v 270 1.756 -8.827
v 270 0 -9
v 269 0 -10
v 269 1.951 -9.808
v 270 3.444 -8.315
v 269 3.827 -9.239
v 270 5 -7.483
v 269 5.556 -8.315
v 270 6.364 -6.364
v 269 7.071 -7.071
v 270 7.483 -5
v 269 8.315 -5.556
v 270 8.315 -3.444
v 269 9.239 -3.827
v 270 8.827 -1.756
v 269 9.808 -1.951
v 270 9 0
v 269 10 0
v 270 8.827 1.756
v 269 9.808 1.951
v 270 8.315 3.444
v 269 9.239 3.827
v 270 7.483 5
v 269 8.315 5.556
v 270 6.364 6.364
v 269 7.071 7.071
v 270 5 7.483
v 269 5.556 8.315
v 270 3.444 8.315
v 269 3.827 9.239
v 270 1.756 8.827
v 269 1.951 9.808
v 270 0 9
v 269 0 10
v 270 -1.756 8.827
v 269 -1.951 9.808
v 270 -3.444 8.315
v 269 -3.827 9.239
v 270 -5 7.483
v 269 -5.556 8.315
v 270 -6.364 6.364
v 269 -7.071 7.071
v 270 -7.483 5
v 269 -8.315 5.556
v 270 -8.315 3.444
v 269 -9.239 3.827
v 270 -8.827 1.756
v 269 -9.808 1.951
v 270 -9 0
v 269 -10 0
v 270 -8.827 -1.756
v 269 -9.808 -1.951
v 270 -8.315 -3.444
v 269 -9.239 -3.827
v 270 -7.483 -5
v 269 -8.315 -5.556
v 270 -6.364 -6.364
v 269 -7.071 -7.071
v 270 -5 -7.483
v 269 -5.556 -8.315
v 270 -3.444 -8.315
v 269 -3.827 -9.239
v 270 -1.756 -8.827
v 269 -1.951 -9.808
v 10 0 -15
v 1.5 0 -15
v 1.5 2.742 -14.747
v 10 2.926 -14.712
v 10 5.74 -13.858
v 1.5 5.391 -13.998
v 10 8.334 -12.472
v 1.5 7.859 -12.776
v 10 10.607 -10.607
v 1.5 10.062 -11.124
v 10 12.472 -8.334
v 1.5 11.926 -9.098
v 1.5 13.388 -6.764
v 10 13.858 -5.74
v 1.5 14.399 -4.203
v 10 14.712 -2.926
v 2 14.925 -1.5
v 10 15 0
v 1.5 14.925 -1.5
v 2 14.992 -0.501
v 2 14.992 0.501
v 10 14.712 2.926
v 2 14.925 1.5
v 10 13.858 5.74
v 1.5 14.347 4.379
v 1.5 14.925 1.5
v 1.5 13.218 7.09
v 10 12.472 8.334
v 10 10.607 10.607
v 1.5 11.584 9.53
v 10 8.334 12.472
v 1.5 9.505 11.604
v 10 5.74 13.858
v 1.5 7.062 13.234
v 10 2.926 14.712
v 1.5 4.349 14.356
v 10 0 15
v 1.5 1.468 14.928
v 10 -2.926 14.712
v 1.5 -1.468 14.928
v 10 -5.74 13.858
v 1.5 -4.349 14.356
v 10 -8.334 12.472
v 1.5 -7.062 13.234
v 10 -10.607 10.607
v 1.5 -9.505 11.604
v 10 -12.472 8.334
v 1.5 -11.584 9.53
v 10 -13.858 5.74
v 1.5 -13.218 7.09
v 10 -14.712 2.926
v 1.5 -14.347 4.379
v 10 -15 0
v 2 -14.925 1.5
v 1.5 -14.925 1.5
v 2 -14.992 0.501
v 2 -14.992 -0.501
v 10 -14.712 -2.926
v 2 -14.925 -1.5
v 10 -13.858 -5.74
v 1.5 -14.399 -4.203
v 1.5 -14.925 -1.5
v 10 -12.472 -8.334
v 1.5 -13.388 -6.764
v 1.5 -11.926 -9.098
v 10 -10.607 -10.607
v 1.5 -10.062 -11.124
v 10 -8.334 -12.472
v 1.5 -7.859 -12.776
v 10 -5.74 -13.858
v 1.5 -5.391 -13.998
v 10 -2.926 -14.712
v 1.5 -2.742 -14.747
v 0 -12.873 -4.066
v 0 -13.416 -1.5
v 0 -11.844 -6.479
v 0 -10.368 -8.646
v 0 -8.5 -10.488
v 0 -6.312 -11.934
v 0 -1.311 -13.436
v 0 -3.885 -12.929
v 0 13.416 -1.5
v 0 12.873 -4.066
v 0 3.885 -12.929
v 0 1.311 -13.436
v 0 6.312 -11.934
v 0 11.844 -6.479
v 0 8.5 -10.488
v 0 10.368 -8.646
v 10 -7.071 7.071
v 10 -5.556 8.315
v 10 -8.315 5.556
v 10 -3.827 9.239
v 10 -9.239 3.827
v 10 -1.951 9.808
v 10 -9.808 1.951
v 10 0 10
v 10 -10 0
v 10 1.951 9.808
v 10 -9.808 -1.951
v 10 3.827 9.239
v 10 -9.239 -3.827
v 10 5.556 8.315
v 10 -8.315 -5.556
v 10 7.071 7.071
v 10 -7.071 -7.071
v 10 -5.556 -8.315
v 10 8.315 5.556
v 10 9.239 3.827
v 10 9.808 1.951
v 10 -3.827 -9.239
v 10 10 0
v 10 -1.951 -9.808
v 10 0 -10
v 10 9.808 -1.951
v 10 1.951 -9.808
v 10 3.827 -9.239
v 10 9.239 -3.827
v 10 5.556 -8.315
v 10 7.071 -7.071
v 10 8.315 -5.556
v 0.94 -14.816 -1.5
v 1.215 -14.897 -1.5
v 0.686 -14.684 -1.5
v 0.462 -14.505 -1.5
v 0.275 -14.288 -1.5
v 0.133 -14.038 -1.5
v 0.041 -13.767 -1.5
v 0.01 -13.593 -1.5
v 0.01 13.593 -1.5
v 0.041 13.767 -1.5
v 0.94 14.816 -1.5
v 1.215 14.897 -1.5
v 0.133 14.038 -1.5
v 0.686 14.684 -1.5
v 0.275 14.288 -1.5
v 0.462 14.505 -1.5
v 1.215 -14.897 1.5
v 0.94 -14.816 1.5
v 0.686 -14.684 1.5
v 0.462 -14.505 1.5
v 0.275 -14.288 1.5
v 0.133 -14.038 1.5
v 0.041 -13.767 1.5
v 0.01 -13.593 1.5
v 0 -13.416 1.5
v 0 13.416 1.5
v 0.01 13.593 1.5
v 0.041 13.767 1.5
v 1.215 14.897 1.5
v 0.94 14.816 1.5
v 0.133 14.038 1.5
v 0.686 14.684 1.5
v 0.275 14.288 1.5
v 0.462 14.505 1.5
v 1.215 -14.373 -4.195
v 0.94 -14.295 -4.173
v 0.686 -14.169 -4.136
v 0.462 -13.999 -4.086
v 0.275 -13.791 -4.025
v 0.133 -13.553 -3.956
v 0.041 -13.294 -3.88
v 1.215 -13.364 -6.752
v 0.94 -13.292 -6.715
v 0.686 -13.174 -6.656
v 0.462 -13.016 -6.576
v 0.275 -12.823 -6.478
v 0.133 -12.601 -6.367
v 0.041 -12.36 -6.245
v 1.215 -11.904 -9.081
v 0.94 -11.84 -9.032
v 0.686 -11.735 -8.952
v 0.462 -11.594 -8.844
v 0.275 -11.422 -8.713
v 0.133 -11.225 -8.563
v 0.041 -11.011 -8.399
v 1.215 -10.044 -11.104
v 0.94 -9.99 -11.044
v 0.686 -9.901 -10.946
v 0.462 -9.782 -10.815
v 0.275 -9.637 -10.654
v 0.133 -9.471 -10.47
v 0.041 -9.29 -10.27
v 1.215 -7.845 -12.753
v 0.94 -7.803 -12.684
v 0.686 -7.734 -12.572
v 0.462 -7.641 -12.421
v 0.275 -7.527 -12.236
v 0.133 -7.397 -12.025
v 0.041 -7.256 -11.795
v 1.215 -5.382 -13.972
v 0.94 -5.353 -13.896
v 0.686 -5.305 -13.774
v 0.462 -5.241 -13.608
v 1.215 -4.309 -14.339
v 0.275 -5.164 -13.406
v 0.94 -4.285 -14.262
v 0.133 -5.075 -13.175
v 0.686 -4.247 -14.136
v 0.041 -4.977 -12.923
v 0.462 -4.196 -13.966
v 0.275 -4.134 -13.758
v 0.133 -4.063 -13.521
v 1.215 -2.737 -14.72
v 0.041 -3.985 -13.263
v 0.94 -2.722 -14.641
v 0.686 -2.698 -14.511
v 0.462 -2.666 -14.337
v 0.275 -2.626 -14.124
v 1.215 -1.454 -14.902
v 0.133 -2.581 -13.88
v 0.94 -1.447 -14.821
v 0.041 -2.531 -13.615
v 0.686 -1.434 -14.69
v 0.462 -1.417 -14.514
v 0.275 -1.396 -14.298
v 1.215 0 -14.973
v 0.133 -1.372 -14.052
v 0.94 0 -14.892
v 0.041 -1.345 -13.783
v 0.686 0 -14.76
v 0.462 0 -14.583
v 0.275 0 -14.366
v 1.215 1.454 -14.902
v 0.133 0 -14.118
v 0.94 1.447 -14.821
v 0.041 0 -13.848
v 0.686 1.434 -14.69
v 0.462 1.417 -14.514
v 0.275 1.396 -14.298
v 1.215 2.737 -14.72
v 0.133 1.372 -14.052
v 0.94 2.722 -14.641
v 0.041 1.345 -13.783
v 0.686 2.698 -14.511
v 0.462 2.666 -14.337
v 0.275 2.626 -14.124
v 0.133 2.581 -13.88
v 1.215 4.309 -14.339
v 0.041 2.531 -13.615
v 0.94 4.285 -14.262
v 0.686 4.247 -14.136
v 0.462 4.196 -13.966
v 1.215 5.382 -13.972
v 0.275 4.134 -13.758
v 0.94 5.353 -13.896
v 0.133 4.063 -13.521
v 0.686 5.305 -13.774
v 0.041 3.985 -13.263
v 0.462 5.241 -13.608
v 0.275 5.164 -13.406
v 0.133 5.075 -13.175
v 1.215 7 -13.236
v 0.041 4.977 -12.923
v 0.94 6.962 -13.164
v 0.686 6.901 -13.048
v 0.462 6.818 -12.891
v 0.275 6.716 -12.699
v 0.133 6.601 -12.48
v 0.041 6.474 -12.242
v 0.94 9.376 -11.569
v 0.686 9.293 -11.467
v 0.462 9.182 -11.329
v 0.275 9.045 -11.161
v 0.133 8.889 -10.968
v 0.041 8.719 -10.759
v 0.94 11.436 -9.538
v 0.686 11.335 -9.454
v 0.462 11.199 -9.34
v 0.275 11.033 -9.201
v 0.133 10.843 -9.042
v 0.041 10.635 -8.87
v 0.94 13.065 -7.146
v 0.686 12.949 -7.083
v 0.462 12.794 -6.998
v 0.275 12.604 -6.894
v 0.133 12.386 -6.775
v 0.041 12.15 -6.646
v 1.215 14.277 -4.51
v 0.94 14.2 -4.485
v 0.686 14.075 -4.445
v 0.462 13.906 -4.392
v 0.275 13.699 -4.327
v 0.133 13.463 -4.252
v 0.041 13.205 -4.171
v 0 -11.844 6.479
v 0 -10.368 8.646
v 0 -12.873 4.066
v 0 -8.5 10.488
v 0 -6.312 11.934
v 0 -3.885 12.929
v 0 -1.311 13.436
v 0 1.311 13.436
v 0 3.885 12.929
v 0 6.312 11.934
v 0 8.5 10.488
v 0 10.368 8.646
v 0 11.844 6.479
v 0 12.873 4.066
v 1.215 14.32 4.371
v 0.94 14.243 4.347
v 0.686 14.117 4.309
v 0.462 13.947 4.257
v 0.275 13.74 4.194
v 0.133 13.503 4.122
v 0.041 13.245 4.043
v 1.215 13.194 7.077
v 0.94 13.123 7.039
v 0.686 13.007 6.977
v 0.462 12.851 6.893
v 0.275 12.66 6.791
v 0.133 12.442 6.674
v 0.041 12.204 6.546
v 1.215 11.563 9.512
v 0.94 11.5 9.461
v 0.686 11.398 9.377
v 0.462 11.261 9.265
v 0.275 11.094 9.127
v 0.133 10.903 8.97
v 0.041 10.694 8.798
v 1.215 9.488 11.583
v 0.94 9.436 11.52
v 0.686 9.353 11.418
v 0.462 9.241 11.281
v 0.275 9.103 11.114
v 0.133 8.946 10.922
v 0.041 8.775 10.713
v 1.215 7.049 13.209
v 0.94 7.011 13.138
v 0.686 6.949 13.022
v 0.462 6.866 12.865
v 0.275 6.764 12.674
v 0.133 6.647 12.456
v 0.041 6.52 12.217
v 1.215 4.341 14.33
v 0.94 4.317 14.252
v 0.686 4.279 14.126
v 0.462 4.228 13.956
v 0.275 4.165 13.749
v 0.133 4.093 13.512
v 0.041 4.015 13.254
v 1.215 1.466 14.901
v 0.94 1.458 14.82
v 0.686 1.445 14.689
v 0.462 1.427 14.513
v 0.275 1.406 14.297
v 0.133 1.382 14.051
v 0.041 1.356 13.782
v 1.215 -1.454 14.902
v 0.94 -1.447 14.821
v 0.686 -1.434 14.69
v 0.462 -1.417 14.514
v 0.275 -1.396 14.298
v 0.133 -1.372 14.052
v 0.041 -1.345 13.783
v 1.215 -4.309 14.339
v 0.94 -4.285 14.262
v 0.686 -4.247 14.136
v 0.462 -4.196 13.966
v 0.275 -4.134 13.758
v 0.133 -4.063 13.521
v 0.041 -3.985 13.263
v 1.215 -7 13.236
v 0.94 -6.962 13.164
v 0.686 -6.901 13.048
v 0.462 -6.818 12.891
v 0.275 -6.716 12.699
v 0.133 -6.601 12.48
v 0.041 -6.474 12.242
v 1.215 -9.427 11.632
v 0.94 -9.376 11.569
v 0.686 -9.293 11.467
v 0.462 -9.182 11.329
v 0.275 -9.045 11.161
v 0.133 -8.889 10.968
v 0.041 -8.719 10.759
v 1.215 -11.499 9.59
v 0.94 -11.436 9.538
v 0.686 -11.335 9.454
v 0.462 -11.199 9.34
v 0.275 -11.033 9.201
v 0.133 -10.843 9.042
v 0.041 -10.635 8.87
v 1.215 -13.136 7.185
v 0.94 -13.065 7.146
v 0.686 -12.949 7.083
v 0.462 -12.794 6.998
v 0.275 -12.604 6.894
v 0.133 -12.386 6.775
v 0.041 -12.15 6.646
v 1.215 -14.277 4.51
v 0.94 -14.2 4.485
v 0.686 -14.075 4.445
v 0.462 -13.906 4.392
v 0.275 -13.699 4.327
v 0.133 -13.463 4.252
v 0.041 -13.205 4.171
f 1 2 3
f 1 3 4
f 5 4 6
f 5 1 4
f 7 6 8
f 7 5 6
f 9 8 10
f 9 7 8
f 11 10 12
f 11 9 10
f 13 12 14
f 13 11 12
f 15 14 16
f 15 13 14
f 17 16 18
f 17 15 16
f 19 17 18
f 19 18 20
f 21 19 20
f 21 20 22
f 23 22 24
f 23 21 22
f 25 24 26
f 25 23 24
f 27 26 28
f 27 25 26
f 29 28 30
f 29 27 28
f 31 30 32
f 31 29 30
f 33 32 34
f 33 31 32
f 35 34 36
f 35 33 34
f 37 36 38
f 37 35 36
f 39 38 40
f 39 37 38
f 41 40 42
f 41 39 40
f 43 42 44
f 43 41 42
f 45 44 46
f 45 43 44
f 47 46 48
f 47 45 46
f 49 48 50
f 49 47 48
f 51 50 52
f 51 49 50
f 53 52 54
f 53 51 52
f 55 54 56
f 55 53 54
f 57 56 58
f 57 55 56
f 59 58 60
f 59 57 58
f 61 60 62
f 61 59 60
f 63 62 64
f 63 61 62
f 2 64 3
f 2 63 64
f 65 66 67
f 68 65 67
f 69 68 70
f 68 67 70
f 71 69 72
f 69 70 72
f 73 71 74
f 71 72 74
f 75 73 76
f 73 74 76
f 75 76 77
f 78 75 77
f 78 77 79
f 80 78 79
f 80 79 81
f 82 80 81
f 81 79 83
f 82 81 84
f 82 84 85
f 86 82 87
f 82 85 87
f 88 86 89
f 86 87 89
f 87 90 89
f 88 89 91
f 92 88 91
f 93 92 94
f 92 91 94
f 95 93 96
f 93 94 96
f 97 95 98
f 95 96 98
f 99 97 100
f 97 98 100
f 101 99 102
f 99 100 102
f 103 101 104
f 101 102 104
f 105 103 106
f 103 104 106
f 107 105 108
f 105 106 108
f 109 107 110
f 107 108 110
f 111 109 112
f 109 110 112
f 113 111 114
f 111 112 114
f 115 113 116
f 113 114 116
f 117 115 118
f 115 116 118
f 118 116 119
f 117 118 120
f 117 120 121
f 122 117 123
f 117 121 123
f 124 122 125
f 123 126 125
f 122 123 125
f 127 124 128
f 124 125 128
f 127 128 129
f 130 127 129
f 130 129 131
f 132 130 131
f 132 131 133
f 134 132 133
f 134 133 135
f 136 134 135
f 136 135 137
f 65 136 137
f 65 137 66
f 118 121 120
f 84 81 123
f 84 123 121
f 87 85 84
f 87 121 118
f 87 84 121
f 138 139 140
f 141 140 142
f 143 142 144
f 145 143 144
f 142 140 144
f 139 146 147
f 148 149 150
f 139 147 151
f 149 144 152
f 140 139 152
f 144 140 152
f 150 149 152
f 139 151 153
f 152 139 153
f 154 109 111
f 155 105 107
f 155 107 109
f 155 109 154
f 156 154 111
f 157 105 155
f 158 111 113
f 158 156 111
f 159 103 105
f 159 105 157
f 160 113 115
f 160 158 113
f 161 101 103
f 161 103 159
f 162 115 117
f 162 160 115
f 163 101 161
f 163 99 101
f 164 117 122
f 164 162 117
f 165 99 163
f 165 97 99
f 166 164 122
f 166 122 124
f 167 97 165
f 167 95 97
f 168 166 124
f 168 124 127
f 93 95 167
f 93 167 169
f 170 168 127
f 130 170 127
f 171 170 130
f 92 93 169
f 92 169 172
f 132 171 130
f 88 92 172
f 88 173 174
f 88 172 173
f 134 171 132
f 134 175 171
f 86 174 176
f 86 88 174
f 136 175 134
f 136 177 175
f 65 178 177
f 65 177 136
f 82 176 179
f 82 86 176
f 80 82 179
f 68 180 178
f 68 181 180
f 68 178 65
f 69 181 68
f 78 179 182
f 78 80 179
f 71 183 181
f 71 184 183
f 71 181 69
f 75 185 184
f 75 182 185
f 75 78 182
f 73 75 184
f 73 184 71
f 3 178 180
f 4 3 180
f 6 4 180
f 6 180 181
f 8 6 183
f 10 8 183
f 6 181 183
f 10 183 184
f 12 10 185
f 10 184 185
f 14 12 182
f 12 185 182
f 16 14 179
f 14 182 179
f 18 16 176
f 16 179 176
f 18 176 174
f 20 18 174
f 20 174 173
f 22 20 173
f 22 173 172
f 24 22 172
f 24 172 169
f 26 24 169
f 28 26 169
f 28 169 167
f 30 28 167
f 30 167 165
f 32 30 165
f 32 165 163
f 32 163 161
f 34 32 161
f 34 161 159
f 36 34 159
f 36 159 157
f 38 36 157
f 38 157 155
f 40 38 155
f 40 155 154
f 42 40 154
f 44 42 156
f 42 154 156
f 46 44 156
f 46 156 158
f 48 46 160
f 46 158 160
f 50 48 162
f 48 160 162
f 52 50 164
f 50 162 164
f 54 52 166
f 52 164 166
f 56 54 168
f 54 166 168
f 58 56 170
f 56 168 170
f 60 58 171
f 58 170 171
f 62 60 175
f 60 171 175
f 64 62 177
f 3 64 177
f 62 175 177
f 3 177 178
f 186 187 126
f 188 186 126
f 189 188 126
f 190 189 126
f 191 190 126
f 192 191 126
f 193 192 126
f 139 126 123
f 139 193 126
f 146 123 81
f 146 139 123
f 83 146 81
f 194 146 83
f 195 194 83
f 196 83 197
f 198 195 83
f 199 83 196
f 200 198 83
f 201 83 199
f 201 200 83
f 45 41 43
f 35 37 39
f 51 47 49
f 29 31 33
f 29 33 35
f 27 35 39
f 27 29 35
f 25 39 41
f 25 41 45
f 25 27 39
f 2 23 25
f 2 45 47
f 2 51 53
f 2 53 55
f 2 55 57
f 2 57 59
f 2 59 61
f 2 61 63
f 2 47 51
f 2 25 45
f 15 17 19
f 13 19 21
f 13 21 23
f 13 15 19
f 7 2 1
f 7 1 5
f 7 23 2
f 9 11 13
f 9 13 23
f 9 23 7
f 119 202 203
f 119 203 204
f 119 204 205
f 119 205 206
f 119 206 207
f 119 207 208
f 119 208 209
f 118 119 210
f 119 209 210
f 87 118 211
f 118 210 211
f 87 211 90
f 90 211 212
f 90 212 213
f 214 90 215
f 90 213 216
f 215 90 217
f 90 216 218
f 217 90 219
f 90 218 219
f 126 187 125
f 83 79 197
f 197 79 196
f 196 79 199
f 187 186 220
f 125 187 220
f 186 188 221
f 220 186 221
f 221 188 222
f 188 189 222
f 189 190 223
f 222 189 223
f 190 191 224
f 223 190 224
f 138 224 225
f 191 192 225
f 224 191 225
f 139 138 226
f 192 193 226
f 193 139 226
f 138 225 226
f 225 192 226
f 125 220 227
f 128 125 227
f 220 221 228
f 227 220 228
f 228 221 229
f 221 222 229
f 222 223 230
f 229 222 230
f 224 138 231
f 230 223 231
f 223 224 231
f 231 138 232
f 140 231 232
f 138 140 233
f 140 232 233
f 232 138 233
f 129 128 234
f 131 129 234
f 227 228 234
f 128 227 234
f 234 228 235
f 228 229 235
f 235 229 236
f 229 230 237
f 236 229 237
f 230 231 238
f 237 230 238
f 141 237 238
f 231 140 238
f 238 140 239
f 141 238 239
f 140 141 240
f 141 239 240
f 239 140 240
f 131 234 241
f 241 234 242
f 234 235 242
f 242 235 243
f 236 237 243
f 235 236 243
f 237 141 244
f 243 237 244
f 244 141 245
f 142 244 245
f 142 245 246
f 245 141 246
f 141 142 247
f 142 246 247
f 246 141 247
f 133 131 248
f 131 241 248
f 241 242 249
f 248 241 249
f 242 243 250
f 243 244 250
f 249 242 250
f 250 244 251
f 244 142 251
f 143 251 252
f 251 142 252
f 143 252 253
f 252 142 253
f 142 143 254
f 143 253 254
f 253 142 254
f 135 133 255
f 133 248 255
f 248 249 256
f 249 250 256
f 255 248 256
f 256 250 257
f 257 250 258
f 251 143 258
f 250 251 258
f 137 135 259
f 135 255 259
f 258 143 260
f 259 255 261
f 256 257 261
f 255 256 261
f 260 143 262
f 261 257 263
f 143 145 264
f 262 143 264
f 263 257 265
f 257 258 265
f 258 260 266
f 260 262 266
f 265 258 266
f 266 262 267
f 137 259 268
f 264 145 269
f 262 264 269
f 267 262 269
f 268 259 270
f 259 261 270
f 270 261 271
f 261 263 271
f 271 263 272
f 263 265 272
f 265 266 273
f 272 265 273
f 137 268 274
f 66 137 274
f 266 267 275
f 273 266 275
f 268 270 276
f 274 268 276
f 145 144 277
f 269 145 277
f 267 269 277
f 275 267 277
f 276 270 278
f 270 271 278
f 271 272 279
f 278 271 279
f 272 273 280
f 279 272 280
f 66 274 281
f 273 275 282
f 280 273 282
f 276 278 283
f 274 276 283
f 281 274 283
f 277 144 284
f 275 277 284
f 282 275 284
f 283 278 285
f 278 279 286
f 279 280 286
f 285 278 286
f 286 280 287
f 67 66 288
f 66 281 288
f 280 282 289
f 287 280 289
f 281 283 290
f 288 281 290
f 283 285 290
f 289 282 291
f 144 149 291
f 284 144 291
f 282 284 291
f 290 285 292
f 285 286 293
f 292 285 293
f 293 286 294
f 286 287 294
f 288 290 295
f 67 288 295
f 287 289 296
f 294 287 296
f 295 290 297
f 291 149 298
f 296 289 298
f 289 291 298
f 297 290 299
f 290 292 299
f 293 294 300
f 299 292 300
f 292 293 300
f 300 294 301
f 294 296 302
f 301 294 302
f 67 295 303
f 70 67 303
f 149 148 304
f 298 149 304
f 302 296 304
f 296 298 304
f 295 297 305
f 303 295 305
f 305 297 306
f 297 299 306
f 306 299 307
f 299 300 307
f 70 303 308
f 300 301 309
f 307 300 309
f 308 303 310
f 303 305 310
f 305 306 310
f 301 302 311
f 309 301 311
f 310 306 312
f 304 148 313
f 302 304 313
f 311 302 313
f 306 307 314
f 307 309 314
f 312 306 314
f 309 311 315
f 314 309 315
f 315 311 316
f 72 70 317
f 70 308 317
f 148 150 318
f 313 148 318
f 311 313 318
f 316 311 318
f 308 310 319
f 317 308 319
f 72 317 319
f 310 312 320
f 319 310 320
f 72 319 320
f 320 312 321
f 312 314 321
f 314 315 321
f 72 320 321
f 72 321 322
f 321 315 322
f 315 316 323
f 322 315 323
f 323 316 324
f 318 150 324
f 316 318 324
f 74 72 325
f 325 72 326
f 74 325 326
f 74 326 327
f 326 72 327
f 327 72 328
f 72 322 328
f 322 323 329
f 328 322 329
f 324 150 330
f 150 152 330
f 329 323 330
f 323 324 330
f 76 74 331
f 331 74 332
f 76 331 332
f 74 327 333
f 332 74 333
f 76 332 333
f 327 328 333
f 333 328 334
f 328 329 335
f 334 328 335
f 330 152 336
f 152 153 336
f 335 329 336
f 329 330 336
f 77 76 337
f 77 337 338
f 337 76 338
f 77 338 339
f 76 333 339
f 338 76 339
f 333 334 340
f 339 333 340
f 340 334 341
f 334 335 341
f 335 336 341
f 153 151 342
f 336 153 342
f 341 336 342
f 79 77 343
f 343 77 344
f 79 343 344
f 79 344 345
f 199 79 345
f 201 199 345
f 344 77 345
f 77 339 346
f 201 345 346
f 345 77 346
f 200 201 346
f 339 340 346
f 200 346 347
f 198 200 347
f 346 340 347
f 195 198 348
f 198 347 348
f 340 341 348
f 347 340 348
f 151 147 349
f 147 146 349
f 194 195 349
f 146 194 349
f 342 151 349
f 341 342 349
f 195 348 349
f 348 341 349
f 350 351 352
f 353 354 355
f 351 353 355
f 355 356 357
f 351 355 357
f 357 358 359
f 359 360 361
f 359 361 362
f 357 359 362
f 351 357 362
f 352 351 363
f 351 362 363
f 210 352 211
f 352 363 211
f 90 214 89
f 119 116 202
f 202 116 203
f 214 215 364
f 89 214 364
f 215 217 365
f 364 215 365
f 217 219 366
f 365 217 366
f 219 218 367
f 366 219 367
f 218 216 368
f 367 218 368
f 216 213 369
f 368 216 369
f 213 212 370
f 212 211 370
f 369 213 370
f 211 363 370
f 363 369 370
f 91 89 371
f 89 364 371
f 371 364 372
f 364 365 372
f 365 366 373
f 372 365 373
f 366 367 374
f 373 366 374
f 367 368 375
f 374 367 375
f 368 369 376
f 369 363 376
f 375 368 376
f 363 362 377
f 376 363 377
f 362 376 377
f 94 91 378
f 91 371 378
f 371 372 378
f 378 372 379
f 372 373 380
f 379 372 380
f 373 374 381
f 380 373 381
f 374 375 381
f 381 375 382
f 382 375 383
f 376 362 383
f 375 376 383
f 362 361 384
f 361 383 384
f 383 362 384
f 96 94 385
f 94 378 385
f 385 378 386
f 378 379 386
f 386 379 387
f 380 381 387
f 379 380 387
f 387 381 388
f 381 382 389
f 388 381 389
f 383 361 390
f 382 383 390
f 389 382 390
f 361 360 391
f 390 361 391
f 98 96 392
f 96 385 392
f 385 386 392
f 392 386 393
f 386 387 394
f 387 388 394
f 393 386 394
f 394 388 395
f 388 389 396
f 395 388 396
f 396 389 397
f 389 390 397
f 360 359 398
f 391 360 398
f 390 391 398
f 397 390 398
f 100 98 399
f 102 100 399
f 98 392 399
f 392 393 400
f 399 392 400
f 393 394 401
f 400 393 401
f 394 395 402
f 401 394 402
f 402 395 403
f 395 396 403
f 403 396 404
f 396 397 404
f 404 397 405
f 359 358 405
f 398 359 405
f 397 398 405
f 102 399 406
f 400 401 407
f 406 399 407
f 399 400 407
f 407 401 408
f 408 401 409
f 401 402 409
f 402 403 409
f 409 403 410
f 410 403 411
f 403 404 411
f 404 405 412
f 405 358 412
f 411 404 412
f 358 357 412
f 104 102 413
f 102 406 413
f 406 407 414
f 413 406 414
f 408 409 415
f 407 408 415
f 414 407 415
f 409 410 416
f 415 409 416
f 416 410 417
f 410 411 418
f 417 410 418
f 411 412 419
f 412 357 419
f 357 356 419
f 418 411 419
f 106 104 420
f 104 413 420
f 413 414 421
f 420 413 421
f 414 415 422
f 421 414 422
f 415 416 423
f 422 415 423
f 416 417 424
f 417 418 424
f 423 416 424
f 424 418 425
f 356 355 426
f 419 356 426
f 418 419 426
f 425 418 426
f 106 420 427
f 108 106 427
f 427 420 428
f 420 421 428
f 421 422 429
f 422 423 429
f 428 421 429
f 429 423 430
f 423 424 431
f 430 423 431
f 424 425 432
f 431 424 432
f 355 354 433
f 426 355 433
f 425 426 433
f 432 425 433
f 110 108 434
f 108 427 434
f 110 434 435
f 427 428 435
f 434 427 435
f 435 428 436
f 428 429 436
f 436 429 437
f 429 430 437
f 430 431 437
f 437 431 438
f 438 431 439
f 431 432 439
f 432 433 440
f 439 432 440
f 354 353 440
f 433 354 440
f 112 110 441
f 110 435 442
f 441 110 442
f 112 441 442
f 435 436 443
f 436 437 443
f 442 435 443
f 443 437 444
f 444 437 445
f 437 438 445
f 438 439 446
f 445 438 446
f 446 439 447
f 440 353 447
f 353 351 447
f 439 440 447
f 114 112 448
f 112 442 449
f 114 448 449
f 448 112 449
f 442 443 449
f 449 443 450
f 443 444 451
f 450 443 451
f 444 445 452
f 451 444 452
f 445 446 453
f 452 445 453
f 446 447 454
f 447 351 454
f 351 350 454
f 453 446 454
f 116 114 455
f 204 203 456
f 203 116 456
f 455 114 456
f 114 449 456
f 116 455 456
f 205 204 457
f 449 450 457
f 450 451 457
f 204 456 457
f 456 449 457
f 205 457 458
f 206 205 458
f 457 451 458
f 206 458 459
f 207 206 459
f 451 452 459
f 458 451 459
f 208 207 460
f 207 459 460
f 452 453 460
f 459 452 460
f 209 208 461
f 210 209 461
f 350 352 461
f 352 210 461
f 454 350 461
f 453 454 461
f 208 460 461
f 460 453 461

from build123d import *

# Parameters (mm, degrees)
SKETCH1_R           = 15
SKETCH1_R_2         = 10
BOSS_EXTRUDE1_DEPTH = 10
SKETCH1_2_R         = 10
BOSS_EXTRUDE2_DEPTH = 270
CHAMFER1_SIZE       = 1
FILLET1_R           = 1.5
SKETCH2_W           = 3
SKETCH2_H           = 32.549334764
CUT_EXTRUDE1_DEPTH  = 2


with BuildPart() as part:
    # Sketch1 → Boss-Extrude1 (new body)
    with BuildSketch(Plane(origin=(0, 0, 0), x_dir=(0, 0, -1), z_dir=(1, 0, 0))):
        Circle(SKETCH1_R)
        Circle(SKETCH1_R_2, mode=Mode.SUBTRACT)
    extrude(amount=BOSS_EXTRUDE1_DEPTH)

    # Sketch1<2> → Boss-Extrude2 (add)
    with BuildSketch(Plane(origin=(0, 0, 0), x_dir=(0, 0, -1), z_dir=(1, 0, 0))):
        Circle(SKETCH1_2_R)
    extrude(amount=BOSS_EXTRUDE2_DEPTH)

    # Chamfer1
    chamfer1_edges = [part.edges().sort_by_distance(p)[0] for p in [
        (270, 0, 10),
    ]]
    chamfer(chamfer1_edges, length=CHAMFER1_SIZE)

    # Fillet1
    fillet1_edges = [part.edges().sort_by_distance(p)[0] for p in [
        (0, 0, 15),
    ]]
    fillet(fillet1_edges, radius=FILLET1_R)

    # Sketch2 → Cut-Extrude1 (cut)
    with BuildSketch(Plane.ZY):
        Rectangle(SKETCH2_W, SKETCH2_H)
    extrude(amount=-CUT_EXTRUDE1_DEPTH, mode=Mode.SUBTRACT)


solid = part.part
